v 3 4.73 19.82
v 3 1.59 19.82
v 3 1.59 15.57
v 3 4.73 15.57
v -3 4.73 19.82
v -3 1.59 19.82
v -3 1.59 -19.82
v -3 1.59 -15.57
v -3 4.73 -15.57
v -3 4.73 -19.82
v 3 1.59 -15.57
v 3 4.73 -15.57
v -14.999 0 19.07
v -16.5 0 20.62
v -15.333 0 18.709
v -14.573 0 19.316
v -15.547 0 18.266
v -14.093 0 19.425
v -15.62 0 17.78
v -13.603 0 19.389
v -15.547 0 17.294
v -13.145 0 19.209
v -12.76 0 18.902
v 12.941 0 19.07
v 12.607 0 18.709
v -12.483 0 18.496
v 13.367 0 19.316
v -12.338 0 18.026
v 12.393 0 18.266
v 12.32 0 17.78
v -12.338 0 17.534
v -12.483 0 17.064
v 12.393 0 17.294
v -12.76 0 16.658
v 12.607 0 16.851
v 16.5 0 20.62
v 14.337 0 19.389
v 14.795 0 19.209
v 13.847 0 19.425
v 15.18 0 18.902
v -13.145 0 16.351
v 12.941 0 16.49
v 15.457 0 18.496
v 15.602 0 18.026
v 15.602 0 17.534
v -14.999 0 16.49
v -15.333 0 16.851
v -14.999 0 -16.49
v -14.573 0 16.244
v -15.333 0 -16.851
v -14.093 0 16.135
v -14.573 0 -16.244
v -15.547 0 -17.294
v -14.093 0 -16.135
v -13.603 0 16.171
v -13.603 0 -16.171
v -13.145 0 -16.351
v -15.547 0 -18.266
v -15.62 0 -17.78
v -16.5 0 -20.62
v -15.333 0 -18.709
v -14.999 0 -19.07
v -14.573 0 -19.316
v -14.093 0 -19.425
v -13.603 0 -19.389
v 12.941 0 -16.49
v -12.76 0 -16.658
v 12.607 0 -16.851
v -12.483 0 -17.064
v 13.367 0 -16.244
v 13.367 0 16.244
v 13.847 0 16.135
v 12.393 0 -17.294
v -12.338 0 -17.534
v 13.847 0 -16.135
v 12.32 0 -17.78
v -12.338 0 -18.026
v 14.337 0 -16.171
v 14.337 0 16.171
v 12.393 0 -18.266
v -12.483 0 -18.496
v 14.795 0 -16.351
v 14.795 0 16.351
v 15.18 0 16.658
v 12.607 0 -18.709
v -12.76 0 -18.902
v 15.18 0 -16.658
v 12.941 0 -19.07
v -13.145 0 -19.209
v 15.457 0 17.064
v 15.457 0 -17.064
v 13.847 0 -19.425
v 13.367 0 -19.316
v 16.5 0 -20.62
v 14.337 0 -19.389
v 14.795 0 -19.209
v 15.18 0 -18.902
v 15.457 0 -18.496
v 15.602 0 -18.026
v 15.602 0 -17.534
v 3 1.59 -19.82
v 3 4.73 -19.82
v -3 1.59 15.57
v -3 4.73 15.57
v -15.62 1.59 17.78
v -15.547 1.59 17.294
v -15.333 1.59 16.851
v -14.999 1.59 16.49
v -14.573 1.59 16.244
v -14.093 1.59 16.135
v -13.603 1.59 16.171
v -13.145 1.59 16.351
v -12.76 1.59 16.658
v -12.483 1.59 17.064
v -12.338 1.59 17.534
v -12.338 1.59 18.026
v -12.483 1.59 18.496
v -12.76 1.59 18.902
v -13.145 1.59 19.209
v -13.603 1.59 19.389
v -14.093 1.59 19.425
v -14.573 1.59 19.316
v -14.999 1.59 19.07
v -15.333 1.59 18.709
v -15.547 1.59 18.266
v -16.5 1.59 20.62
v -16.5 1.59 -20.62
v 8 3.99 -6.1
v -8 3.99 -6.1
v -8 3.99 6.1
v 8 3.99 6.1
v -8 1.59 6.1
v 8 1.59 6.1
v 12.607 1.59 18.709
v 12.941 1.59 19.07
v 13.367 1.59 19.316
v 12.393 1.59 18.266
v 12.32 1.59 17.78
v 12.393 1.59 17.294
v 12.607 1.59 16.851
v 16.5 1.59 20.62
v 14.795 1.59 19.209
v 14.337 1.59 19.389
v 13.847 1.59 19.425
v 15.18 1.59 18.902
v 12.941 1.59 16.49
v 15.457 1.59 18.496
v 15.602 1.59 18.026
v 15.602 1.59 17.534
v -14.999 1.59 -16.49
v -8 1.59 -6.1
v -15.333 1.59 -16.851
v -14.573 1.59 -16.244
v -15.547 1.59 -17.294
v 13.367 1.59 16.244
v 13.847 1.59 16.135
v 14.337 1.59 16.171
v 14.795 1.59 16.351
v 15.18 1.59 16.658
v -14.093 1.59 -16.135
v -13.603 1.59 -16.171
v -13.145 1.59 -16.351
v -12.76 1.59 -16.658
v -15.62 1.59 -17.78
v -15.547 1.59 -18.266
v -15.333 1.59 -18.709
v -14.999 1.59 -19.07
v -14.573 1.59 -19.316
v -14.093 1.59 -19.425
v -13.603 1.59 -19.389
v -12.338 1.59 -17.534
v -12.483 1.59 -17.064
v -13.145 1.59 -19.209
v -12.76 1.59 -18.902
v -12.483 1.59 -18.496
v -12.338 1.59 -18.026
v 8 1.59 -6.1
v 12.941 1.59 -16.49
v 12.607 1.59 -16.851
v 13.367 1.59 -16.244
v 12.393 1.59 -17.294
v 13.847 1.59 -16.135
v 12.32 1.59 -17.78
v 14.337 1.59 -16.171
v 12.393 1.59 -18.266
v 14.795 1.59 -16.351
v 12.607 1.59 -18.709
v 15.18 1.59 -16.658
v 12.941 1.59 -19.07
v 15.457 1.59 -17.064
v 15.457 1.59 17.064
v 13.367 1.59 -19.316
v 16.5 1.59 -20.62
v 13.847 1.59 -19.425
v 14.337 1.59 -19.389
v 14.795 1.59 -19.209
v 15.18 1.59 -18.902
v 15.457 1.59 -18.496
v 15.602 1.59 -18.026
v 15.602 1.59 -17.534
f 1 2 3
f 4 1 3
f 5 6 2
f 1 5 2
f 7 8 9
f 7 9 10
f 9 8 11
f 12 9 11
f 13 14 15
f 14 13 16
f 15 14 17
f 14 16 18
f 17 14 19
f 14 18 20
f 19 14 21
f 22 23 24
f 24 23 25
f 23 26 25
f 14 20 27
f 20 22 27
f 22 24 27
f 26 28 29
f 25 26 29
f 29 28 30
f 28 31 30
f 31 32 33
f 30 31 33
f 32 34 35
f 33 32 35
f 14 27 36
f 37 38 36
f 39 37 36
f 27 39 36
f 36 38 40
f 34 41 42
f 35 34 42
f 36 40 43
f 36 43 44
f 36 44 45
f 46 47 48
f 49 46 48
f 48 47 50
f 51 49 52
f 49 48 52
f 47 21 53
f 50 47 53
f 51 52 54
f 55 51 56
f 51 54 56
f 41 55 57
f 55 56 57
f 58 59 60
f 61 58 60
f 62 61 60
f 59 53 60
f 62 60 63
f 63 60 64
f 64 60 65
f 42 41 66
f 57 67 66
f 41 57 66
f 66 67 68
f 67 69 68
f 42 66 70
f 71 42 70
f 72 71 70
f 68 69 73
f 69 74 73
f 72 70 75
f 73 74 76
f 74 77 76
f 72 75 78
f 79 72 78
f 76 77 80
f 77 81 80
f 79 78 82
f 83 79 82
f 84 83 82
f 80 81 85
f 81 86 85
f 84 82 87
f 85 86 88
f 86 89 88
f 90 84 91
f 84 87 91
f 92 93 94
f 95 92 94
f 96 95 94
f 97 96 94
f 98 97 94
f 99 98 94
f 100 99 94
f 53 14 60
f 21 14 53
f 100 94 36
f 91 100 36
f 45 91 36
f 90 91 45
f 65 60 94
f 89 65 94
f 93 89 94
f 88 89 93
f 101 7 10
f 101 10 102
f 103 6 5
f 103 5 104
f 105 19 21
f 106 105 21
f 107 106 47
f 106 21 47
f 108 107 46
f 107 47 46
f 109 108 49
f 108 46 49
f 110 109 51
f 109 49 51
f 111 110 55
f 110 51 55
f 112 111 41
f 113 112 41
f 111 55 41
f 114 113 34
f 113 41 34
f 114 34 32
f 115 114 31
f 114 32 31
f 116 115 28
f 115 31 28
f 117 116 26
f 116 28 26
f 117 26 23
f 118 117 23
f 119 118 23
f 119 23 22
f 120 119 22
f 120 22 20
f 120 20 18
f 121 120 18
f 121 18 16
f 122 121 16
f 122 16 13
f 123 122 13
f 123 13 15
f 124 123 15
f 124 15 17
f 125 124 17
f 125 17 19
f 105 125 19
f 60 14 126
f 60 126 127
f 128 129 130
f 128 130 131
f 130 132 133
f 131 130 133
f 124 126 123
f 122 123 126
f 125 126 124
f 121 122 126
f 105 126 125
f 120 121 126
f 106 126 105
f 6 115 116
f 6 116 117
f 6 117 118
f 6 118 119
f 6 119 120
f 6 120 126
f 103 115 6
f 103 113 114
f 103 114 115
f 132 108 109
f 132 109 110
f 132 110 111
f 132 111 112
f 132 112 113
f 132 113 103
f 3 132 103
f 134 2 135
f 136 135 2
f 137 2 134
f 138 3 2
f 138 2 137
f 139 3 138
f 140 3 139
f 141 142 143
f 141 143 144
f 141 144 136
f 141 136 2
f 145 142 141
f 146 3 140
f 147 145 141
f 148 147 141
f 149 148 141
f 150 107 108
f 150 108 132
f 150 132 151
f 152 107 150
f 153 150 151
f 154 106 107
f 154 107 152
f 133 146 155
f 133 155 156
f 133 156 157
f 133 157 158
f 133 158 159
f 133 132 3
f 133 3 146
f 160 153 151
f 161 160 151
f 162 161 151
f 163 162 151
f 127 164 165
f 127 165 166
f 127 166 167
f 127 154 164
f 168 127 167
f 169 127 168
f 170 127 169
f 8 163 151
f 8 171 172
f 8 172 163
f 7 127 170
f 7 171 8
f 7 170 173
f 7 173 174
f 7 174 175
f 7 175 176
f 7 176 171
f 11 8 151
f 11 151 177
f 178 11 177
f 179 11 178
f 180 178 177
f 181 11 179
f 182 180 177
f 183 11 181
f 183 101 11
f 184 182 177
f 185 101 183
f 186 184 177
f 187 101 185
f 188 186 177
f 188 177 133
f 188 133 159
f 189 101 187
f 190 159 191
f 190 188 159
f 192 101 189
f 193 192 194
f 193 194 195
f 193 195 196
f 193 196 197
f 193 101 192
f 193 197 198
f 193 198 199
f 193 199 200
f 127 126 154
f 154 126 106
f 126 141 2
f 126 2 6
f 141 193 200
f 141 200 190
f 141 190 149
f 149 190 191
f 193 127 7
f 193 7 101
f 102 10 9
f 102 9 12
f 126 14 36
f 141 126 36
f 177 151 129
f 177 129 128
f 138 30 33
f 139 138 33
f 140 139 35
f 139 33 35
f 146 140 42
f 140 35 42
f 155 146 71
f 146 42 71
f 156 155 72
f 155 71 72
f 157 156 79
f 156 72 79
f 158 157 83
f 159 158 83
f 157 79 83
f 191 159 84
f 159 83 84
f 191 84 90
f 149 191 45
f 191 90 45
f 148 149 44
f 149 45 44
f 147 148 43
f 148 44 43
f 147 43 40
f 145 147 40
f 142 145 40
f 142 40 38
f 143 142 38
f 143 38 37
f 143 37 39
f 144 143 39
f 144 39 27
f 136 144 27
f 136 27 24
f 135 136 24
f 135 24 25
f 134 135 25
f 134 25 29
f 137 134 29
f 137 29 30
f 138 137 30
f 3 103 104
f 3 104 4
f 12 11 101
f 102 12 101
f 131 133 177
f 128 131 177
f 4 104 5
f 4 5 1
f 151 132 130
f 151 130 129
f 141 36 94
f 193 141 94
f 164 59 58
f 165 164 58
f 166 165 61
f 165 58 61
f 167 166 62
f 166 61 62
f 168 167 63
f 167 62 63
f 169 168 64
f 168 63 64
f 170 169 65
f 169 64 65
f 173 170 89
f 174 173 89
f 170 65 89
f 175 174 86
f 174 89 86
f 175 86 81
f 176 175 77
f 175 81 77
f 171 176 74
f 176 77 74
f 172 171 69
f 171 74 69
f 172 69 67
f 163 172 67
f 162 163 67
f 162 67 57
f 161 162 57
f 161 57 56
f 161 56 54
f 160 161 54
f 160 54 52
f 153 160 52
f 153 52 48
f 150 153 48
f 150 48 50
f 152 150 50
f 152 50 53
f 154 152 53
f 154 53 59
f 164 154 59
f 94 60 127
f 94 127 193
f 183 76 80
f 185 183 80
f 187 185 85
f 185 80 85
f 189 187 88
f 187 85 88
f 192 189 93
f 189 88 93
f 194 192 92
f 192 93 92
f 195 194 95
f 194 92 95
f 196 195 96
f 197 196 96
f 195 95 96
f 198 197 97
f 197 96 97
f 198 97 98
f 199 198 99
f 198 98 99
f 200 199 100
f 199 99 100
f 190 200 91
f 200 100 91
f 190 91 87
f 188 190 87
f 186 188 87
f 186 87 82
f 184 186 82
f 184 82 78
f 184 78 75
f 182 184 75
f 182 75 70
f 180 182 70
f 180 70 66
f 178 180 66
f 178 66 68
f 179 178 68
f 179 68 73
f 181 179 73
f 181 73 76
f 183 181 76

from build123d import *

# Parameters (mm, degrees)
SKETCH1_W            = 33
SKETCH1_H            = 41.24
BOSS_EXTRUDE1_DEPTH  = 1.59
M3_CLEARANCE_HOLE1_D = 3.3
SKETCH6_W            = 16
SKETCH6_H            = 12.2
M8P_DEPTH            = 2.4
SKETCH7_W            = 6
SKETCH7_H            = 4.25
I2C_CONNECTORS_DEPTH = 3.14


with BuildPart() as part:
    # Sketch1 → Boss-Extrude1 (new body)
    with BuildSketch(Plane(origin=(0, 0, 0), x_dir=(1, 0, 0), z_dir=(0, 1, 0))):
        Rectangle(SKETCH1_W, SKETCH1_H)
    extrude(amount=BOSS_EXTRUDE1_DEPTH)

    # M3 Clearance Hole1 (through all)
    with Locations(Plane(origin=(0, 1.59, 0), x_dir=(1, 0, 0), z_dir=(0, 1, 0))):
        with Locations((-13.97, 17.78), (13.97, 17.78), (13.97, -17.78), (-13.97, -17.78)):
            Hole(M3_CLEARANCE_HOLE1_D / 2)

    # Sketch6 → M8P (add)
    with BuildSketch(Plane(origin=(0, 1.59, 0), x_dir=(1, 0, 0), z_dir=(0, 1, 0))):
        Rectangle(SKETCH6_W, SKETCH6_H)
    extrude(amount=M8P_DEPTH)

    # Sketch7 → I2C connectors (add)
    with BuildSketch(Plane(origin=(0, 1.59, 0), x_dir=(1, 0, 0), z_dir=(0, 1, 0))):
        with Locations((0, -17.695)):
            Rectangle(SKETCH7_W, SKETCH7_H)
        with Locations((0, 17.695)):
            Rectangle(SKETCH7_W, SKETCH7_H)
    extrude(amount=I2C_CONNECTORS_DEPTH)


solid = part.part
